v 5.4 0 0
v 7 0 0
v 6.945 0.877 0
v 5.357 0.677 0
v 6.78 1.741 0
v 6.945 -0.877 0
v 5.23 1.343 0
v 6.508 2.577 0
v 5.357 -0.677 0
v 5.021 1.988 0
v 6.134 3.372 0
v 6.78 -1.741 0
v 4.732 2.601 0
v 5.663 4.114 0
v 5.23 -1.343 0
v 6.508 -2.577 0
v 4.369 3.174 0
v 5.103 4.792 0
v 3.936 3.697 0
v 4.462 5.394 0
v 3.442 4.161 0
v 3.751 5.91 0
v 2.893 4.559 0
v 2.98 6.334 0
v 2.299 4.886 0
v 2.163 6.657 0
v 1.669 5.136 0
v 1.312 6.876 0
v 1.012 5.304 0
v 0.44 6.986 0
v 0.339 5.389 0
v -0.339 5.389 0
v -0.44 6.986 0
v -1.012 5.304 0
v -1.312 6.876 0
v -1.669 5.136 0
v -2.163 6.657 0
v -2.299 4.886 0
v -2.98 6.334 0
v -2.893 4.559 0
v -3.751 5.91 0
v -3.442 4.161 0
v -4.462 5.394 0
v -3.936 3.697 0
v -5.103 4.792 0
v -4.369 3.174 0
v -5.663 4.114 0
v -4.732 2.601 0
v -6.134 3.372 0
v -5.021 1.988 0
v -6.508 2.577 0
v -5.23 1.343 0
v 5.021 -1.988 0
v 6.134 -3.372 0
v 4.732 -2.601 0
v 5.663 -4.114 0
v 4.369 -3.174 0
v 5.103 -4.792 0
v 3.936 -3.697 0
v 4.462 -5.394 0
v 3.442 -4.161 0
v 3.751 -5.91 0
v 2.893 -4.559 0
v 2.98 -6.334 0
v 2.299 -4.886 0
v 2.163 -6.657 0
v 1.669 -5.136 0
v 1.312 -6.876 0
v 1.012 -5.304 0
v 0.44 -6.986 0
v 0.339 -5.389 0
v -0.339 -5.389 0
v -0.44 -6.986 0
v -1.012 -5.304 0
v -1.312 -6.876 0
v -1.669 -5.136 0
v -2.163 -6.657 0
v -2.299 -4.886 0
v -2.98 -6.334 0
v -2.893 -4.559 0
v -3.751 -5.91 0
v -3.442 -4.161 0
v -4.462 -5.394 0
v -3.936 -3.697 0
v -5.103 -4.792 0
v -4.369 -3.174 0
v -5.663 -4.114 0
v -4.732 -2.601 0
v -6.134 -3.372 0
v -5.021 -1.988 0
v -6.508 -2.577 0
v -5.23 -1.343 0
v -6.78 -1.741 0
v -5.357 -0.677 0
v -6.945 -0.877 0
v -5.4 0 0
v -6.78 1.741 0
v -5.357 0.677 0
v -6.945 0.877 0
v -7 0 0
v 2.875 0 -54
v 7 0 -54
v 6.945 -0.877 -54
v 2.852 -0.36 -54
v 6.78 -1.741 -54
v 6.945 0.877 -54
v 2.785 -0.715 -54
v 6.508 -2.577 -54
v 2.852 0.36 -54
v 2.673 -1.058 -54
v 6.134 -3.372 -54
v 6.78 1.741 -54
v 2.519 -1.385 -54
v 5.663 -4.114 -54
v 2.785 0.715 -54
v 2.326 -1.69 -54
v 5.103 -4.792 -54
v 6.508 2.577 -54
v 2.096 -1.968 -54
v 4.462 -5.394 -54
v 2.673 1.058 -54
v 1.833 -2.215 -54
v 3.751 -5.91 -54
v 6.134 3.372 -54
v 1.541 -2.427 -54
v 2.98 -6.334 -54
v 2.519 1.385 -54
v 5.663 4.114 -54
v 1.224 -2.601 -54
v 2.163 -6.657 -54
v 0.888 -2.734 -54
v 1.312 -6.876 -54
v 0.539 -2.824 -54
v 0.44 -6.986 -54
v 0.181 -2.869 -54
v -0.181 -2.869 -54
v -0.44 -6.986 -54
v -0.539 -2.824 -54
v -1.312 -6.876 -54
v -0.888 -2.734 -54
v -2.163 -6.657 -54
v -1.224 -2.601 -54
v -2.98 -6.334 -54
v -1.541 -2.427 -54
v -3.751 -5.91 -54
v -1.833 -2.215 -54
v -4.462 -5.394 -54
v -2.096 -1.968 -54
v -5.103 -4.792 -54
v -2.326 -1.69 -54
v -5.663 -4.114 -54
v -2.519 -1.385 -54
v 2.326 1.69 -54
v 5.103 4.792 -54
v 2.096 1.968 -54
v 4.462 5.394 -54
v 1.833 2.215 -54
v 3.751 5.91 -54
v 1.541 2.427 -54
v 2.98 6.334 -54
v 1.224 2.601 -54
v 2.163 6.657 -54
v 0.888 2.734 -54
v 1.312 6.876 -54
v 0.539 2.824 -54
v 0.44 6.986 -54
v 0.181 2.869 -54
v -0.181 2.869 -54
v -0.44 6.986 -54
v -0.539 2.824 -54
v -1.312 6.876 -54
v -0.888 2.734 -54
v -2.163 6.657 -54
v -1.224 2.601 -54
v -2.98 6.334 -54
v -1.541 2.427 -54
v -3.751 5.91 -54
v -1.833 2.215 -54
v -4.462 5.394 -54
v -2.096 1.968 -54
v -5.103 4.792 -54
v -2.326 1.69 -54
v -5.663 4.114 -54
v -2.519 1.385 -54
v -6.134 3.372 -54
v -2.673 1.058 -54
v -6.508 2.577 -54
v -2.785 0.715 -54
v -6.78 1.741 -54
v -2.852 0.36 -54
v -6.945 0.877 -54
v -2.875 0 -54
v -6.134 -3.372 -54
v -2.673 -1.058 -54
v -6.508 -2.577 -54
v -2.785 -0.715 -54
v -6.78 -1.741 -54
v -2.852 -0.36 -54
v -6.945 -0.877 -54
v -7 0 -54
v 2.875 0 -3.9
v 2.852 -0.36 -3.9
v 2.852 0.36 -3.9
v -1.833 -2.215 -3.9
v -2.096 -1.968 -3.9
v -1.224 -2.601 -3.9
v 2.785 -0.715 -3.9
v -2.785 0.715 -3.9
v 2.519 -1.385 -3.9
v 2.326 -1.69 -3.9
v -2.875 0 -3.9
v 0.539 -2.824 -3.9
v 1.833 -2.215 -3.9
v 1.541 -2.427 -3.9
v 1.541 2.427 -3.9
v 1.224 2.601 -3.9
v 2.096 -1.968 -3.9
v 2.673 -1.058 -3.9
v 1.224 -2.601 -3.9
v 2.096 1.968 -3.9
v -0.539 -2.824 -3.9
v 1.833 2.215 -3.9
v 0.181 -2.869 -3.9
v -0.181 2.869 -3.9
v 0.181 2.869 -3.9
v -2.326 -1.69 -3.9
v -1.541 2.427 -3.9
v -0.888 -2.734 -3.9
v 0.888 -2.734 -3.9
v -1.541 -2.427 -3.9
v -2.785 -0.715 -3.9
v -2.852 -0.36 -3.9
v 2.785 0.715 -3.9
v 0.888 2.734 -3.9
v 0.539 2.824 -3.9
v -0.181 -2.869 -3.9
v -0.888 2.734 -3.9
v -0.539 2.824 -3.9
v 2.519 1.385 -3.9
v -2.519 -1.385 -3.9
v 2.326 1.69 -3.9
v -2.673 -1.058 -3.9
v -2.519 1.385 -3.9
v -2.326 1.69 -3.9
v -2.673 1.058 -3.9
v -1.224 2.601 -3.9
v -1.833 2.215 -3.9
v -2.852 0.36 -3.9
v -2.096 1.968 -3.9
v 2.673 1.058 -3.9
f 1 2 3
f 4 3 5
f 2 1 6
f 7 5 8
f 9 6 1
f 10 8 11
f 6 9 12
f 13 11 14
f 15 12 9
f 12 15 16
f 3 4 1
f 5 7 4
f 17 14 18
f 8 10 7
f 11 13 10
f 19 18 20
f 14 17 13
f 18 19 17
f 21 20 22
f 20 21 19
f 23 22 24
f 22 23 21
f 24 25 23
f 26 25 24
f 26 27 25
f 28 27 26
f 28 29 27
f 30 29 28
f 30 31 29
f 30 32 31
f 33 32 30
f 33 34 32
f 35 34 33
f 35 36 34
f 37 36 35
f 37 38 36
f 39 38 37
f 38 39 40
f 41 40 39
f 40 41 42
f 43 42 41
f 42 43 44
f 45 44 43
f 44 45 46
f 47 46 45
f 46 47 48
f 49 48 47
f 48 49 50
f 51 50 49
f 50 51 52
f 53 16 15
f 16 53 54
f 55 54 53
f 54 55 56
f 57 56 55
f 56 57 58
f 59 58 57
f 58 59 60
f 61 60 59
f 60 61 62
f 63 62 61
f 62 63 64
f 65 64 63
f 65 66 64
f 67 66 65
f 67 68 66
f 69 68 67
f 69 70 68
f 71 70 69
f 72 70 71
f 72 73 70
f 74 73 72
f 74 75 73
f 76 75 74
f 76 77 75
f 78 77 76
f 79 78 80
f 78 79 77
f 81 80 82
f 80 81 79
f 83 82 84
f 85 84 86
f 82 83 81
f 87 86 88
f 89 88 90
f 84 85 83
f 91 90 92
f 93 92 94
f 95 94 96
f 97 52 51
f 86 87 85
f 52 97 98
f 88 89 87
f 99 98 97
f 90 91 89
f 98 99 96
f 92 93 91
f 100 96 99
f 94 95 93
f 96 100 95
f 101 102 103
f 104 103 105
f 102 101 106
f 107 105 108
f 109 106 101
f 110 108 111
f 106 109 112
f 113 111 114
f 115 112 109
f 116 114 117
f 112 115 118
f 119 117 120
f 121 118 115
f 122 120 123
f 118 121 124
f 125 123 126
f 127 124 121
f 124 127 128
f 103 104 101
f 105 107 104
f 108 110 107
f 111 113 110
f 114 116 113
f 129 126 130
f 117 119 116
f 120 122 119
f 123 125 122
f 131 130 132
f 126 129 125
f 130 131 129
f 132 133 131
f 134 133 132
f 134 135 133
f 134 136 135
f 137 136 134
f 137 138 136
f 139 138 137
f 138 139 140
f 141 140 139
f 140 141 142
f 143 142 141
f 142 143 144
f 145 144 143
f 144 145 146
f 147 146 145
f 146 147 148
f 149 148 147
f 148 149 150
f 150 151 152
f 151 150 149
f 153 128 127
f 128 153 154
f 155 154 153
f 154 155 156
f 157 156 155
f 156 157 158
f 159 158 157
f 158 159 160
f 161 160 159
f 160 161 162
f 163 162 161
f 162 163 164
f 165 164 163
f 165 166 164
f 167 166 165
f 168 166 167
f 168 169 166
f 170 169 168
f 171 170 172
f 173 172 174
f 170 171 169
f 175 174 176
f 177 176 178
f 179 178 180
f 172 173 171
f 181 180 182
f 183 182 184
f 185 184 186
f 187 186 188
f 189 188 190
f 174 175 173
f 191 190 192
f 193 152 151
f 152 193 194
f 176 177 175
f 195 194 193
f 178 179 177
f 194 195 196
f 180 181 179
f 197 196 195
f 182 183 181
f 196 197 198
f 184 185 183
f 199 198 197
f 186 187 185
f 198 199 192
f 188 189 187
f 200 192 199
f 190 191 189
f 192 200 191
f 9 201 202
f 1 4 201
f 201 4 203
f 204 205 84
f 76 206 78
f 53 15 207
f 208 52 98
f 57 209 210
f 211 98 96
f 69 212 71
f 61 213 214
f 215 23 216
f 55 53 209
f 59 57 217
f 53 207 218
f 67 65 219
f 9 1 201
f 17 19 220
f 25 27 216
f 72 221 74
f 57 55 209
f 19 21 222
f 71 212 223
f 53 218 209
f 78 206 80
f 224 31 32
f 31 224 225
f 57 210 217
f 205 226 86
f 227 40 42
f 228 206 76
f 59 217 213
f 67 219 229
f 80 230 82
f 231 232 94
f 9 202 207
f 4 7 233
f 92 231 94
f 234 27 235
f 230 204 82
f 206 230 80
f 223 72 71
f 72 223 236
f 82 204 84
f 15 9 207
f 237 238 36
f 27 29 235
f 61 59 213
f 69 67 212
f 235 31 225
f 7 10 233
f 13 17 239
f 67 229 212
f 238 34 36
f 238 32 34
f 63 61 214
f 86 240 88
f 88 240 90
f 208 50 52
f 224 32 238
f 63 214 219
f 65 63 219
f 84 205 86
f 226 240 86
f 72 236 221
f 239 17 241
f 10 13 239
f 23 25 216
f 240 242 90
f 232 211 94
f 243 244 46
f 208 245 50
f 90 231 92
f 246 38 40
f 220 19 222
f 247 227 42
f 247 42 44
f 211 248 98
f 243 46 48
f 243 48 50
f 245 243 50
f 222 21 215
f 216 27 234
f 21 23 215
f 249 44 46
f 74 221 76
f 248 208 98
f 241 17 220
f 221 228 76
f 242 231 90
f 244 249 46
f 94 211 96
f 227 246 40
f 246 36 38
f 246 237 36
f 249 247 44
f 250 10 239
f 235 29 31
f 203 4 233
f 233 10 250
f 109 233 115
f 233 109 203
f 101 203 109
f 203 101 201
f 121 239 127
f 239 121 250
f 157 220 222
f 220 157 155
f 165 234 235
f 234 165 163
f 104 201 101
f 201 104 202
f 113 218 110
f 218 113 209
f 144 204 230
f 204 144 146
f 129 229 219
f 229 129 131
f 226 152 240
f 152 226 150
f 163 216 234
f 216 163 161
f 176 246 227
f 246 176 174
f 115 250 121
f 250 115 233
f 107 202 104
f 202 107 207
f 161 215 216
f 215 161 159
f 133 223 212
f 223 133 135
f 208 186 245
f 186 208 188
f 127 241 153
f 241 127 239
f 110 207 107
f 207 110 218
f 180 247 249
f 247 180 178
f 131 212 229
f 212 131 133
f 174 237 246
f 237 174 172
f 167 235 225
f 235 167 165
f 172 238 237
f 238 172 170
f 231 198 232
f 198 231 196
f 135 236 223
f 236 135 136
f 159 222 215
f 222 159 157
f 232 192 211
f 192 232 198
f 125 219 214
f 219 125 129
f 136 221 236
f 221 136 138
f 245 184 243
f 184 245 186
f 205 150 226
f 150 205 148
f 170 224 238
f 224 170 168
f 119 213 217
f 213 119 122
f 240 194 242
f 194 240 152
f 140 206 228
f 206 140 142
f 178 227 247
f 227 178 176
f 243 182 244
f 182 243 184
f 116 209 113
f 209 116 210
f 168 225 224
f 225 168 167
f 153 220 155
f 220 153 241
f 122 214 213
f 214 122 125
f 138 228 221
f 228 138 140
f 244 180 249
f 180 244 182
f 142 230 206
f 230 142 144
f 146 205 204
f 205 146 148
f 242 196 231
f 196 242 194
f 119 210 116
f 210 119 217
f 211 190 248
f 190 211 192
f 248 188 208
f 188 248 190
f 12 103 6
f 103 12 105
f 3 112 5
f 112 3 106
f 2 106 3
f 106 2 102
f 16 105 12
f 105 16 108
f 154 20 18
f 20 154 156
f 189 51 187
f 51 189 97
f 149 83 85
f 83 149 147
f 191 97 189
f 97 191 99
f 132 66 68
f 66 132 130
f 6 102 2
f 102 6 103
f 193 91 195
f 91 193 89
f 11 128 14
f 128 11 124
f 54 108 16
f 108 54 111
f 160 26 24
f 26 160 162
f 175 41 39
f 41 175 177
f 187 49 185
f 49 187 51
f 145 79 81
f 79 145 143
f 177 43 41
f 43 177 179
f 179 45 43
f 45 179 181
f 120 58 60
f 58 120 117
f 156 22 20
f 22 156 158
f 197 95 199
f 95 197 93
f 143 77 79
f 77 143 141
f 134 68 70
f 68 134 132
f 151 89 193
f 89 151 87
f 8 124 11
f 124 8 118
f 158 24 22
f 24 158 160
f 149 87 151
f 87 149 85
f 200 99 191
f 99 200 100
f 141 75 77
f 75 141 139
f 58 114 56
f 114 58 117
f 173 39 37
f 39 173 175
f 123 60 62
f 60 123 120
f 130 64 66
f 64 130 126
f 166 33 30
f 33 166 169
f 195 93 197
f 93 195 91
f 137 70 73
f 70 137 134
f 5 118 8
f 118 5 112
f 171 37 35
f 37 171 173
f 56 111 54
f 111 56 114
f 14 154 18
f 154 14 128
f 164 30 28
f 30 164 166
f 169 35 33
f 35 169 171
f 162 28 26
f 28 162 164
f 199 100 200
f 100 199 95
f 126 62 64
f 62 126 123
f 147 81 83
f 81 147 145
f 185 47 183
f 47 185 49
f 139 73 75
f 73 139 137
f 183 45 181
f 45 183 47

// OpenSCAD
$fn = 50;


difference() {
	union() {
		translate(v = [0, 0, -54.0000000000]) {
			cylinder(h = 54, r = 7.0000000000);
		}
		cylinder(h = 0, r = 13.0000000000);
	}
	union() {
		translate(v = [0, 0, 0]) {
			rotate(a = [0, 0, 0]) {
				difference() {
					union() {
						#translate(v = [0, 0, -54.0000000000]) {
							cylinder(h = 54, r = 2.6000000000);
						}
						#translate(v = [0, 0, -3.9000000000]) {
							cylinder(h = 3.9000000000, r1 = 2.8750000000, r2 = 5.4000000000);
						}
						#translate(v = [0, 0, -54.0000000000]) {
							cylinder(h = 54, r = 2.8750000000);
						}
						#translate(v = [0, 0, -54.0000000000]) {
							cylinder(h = 54, r = 2.6000000000);
						}
					}
					union();
				}
			}
		}
	}
}
